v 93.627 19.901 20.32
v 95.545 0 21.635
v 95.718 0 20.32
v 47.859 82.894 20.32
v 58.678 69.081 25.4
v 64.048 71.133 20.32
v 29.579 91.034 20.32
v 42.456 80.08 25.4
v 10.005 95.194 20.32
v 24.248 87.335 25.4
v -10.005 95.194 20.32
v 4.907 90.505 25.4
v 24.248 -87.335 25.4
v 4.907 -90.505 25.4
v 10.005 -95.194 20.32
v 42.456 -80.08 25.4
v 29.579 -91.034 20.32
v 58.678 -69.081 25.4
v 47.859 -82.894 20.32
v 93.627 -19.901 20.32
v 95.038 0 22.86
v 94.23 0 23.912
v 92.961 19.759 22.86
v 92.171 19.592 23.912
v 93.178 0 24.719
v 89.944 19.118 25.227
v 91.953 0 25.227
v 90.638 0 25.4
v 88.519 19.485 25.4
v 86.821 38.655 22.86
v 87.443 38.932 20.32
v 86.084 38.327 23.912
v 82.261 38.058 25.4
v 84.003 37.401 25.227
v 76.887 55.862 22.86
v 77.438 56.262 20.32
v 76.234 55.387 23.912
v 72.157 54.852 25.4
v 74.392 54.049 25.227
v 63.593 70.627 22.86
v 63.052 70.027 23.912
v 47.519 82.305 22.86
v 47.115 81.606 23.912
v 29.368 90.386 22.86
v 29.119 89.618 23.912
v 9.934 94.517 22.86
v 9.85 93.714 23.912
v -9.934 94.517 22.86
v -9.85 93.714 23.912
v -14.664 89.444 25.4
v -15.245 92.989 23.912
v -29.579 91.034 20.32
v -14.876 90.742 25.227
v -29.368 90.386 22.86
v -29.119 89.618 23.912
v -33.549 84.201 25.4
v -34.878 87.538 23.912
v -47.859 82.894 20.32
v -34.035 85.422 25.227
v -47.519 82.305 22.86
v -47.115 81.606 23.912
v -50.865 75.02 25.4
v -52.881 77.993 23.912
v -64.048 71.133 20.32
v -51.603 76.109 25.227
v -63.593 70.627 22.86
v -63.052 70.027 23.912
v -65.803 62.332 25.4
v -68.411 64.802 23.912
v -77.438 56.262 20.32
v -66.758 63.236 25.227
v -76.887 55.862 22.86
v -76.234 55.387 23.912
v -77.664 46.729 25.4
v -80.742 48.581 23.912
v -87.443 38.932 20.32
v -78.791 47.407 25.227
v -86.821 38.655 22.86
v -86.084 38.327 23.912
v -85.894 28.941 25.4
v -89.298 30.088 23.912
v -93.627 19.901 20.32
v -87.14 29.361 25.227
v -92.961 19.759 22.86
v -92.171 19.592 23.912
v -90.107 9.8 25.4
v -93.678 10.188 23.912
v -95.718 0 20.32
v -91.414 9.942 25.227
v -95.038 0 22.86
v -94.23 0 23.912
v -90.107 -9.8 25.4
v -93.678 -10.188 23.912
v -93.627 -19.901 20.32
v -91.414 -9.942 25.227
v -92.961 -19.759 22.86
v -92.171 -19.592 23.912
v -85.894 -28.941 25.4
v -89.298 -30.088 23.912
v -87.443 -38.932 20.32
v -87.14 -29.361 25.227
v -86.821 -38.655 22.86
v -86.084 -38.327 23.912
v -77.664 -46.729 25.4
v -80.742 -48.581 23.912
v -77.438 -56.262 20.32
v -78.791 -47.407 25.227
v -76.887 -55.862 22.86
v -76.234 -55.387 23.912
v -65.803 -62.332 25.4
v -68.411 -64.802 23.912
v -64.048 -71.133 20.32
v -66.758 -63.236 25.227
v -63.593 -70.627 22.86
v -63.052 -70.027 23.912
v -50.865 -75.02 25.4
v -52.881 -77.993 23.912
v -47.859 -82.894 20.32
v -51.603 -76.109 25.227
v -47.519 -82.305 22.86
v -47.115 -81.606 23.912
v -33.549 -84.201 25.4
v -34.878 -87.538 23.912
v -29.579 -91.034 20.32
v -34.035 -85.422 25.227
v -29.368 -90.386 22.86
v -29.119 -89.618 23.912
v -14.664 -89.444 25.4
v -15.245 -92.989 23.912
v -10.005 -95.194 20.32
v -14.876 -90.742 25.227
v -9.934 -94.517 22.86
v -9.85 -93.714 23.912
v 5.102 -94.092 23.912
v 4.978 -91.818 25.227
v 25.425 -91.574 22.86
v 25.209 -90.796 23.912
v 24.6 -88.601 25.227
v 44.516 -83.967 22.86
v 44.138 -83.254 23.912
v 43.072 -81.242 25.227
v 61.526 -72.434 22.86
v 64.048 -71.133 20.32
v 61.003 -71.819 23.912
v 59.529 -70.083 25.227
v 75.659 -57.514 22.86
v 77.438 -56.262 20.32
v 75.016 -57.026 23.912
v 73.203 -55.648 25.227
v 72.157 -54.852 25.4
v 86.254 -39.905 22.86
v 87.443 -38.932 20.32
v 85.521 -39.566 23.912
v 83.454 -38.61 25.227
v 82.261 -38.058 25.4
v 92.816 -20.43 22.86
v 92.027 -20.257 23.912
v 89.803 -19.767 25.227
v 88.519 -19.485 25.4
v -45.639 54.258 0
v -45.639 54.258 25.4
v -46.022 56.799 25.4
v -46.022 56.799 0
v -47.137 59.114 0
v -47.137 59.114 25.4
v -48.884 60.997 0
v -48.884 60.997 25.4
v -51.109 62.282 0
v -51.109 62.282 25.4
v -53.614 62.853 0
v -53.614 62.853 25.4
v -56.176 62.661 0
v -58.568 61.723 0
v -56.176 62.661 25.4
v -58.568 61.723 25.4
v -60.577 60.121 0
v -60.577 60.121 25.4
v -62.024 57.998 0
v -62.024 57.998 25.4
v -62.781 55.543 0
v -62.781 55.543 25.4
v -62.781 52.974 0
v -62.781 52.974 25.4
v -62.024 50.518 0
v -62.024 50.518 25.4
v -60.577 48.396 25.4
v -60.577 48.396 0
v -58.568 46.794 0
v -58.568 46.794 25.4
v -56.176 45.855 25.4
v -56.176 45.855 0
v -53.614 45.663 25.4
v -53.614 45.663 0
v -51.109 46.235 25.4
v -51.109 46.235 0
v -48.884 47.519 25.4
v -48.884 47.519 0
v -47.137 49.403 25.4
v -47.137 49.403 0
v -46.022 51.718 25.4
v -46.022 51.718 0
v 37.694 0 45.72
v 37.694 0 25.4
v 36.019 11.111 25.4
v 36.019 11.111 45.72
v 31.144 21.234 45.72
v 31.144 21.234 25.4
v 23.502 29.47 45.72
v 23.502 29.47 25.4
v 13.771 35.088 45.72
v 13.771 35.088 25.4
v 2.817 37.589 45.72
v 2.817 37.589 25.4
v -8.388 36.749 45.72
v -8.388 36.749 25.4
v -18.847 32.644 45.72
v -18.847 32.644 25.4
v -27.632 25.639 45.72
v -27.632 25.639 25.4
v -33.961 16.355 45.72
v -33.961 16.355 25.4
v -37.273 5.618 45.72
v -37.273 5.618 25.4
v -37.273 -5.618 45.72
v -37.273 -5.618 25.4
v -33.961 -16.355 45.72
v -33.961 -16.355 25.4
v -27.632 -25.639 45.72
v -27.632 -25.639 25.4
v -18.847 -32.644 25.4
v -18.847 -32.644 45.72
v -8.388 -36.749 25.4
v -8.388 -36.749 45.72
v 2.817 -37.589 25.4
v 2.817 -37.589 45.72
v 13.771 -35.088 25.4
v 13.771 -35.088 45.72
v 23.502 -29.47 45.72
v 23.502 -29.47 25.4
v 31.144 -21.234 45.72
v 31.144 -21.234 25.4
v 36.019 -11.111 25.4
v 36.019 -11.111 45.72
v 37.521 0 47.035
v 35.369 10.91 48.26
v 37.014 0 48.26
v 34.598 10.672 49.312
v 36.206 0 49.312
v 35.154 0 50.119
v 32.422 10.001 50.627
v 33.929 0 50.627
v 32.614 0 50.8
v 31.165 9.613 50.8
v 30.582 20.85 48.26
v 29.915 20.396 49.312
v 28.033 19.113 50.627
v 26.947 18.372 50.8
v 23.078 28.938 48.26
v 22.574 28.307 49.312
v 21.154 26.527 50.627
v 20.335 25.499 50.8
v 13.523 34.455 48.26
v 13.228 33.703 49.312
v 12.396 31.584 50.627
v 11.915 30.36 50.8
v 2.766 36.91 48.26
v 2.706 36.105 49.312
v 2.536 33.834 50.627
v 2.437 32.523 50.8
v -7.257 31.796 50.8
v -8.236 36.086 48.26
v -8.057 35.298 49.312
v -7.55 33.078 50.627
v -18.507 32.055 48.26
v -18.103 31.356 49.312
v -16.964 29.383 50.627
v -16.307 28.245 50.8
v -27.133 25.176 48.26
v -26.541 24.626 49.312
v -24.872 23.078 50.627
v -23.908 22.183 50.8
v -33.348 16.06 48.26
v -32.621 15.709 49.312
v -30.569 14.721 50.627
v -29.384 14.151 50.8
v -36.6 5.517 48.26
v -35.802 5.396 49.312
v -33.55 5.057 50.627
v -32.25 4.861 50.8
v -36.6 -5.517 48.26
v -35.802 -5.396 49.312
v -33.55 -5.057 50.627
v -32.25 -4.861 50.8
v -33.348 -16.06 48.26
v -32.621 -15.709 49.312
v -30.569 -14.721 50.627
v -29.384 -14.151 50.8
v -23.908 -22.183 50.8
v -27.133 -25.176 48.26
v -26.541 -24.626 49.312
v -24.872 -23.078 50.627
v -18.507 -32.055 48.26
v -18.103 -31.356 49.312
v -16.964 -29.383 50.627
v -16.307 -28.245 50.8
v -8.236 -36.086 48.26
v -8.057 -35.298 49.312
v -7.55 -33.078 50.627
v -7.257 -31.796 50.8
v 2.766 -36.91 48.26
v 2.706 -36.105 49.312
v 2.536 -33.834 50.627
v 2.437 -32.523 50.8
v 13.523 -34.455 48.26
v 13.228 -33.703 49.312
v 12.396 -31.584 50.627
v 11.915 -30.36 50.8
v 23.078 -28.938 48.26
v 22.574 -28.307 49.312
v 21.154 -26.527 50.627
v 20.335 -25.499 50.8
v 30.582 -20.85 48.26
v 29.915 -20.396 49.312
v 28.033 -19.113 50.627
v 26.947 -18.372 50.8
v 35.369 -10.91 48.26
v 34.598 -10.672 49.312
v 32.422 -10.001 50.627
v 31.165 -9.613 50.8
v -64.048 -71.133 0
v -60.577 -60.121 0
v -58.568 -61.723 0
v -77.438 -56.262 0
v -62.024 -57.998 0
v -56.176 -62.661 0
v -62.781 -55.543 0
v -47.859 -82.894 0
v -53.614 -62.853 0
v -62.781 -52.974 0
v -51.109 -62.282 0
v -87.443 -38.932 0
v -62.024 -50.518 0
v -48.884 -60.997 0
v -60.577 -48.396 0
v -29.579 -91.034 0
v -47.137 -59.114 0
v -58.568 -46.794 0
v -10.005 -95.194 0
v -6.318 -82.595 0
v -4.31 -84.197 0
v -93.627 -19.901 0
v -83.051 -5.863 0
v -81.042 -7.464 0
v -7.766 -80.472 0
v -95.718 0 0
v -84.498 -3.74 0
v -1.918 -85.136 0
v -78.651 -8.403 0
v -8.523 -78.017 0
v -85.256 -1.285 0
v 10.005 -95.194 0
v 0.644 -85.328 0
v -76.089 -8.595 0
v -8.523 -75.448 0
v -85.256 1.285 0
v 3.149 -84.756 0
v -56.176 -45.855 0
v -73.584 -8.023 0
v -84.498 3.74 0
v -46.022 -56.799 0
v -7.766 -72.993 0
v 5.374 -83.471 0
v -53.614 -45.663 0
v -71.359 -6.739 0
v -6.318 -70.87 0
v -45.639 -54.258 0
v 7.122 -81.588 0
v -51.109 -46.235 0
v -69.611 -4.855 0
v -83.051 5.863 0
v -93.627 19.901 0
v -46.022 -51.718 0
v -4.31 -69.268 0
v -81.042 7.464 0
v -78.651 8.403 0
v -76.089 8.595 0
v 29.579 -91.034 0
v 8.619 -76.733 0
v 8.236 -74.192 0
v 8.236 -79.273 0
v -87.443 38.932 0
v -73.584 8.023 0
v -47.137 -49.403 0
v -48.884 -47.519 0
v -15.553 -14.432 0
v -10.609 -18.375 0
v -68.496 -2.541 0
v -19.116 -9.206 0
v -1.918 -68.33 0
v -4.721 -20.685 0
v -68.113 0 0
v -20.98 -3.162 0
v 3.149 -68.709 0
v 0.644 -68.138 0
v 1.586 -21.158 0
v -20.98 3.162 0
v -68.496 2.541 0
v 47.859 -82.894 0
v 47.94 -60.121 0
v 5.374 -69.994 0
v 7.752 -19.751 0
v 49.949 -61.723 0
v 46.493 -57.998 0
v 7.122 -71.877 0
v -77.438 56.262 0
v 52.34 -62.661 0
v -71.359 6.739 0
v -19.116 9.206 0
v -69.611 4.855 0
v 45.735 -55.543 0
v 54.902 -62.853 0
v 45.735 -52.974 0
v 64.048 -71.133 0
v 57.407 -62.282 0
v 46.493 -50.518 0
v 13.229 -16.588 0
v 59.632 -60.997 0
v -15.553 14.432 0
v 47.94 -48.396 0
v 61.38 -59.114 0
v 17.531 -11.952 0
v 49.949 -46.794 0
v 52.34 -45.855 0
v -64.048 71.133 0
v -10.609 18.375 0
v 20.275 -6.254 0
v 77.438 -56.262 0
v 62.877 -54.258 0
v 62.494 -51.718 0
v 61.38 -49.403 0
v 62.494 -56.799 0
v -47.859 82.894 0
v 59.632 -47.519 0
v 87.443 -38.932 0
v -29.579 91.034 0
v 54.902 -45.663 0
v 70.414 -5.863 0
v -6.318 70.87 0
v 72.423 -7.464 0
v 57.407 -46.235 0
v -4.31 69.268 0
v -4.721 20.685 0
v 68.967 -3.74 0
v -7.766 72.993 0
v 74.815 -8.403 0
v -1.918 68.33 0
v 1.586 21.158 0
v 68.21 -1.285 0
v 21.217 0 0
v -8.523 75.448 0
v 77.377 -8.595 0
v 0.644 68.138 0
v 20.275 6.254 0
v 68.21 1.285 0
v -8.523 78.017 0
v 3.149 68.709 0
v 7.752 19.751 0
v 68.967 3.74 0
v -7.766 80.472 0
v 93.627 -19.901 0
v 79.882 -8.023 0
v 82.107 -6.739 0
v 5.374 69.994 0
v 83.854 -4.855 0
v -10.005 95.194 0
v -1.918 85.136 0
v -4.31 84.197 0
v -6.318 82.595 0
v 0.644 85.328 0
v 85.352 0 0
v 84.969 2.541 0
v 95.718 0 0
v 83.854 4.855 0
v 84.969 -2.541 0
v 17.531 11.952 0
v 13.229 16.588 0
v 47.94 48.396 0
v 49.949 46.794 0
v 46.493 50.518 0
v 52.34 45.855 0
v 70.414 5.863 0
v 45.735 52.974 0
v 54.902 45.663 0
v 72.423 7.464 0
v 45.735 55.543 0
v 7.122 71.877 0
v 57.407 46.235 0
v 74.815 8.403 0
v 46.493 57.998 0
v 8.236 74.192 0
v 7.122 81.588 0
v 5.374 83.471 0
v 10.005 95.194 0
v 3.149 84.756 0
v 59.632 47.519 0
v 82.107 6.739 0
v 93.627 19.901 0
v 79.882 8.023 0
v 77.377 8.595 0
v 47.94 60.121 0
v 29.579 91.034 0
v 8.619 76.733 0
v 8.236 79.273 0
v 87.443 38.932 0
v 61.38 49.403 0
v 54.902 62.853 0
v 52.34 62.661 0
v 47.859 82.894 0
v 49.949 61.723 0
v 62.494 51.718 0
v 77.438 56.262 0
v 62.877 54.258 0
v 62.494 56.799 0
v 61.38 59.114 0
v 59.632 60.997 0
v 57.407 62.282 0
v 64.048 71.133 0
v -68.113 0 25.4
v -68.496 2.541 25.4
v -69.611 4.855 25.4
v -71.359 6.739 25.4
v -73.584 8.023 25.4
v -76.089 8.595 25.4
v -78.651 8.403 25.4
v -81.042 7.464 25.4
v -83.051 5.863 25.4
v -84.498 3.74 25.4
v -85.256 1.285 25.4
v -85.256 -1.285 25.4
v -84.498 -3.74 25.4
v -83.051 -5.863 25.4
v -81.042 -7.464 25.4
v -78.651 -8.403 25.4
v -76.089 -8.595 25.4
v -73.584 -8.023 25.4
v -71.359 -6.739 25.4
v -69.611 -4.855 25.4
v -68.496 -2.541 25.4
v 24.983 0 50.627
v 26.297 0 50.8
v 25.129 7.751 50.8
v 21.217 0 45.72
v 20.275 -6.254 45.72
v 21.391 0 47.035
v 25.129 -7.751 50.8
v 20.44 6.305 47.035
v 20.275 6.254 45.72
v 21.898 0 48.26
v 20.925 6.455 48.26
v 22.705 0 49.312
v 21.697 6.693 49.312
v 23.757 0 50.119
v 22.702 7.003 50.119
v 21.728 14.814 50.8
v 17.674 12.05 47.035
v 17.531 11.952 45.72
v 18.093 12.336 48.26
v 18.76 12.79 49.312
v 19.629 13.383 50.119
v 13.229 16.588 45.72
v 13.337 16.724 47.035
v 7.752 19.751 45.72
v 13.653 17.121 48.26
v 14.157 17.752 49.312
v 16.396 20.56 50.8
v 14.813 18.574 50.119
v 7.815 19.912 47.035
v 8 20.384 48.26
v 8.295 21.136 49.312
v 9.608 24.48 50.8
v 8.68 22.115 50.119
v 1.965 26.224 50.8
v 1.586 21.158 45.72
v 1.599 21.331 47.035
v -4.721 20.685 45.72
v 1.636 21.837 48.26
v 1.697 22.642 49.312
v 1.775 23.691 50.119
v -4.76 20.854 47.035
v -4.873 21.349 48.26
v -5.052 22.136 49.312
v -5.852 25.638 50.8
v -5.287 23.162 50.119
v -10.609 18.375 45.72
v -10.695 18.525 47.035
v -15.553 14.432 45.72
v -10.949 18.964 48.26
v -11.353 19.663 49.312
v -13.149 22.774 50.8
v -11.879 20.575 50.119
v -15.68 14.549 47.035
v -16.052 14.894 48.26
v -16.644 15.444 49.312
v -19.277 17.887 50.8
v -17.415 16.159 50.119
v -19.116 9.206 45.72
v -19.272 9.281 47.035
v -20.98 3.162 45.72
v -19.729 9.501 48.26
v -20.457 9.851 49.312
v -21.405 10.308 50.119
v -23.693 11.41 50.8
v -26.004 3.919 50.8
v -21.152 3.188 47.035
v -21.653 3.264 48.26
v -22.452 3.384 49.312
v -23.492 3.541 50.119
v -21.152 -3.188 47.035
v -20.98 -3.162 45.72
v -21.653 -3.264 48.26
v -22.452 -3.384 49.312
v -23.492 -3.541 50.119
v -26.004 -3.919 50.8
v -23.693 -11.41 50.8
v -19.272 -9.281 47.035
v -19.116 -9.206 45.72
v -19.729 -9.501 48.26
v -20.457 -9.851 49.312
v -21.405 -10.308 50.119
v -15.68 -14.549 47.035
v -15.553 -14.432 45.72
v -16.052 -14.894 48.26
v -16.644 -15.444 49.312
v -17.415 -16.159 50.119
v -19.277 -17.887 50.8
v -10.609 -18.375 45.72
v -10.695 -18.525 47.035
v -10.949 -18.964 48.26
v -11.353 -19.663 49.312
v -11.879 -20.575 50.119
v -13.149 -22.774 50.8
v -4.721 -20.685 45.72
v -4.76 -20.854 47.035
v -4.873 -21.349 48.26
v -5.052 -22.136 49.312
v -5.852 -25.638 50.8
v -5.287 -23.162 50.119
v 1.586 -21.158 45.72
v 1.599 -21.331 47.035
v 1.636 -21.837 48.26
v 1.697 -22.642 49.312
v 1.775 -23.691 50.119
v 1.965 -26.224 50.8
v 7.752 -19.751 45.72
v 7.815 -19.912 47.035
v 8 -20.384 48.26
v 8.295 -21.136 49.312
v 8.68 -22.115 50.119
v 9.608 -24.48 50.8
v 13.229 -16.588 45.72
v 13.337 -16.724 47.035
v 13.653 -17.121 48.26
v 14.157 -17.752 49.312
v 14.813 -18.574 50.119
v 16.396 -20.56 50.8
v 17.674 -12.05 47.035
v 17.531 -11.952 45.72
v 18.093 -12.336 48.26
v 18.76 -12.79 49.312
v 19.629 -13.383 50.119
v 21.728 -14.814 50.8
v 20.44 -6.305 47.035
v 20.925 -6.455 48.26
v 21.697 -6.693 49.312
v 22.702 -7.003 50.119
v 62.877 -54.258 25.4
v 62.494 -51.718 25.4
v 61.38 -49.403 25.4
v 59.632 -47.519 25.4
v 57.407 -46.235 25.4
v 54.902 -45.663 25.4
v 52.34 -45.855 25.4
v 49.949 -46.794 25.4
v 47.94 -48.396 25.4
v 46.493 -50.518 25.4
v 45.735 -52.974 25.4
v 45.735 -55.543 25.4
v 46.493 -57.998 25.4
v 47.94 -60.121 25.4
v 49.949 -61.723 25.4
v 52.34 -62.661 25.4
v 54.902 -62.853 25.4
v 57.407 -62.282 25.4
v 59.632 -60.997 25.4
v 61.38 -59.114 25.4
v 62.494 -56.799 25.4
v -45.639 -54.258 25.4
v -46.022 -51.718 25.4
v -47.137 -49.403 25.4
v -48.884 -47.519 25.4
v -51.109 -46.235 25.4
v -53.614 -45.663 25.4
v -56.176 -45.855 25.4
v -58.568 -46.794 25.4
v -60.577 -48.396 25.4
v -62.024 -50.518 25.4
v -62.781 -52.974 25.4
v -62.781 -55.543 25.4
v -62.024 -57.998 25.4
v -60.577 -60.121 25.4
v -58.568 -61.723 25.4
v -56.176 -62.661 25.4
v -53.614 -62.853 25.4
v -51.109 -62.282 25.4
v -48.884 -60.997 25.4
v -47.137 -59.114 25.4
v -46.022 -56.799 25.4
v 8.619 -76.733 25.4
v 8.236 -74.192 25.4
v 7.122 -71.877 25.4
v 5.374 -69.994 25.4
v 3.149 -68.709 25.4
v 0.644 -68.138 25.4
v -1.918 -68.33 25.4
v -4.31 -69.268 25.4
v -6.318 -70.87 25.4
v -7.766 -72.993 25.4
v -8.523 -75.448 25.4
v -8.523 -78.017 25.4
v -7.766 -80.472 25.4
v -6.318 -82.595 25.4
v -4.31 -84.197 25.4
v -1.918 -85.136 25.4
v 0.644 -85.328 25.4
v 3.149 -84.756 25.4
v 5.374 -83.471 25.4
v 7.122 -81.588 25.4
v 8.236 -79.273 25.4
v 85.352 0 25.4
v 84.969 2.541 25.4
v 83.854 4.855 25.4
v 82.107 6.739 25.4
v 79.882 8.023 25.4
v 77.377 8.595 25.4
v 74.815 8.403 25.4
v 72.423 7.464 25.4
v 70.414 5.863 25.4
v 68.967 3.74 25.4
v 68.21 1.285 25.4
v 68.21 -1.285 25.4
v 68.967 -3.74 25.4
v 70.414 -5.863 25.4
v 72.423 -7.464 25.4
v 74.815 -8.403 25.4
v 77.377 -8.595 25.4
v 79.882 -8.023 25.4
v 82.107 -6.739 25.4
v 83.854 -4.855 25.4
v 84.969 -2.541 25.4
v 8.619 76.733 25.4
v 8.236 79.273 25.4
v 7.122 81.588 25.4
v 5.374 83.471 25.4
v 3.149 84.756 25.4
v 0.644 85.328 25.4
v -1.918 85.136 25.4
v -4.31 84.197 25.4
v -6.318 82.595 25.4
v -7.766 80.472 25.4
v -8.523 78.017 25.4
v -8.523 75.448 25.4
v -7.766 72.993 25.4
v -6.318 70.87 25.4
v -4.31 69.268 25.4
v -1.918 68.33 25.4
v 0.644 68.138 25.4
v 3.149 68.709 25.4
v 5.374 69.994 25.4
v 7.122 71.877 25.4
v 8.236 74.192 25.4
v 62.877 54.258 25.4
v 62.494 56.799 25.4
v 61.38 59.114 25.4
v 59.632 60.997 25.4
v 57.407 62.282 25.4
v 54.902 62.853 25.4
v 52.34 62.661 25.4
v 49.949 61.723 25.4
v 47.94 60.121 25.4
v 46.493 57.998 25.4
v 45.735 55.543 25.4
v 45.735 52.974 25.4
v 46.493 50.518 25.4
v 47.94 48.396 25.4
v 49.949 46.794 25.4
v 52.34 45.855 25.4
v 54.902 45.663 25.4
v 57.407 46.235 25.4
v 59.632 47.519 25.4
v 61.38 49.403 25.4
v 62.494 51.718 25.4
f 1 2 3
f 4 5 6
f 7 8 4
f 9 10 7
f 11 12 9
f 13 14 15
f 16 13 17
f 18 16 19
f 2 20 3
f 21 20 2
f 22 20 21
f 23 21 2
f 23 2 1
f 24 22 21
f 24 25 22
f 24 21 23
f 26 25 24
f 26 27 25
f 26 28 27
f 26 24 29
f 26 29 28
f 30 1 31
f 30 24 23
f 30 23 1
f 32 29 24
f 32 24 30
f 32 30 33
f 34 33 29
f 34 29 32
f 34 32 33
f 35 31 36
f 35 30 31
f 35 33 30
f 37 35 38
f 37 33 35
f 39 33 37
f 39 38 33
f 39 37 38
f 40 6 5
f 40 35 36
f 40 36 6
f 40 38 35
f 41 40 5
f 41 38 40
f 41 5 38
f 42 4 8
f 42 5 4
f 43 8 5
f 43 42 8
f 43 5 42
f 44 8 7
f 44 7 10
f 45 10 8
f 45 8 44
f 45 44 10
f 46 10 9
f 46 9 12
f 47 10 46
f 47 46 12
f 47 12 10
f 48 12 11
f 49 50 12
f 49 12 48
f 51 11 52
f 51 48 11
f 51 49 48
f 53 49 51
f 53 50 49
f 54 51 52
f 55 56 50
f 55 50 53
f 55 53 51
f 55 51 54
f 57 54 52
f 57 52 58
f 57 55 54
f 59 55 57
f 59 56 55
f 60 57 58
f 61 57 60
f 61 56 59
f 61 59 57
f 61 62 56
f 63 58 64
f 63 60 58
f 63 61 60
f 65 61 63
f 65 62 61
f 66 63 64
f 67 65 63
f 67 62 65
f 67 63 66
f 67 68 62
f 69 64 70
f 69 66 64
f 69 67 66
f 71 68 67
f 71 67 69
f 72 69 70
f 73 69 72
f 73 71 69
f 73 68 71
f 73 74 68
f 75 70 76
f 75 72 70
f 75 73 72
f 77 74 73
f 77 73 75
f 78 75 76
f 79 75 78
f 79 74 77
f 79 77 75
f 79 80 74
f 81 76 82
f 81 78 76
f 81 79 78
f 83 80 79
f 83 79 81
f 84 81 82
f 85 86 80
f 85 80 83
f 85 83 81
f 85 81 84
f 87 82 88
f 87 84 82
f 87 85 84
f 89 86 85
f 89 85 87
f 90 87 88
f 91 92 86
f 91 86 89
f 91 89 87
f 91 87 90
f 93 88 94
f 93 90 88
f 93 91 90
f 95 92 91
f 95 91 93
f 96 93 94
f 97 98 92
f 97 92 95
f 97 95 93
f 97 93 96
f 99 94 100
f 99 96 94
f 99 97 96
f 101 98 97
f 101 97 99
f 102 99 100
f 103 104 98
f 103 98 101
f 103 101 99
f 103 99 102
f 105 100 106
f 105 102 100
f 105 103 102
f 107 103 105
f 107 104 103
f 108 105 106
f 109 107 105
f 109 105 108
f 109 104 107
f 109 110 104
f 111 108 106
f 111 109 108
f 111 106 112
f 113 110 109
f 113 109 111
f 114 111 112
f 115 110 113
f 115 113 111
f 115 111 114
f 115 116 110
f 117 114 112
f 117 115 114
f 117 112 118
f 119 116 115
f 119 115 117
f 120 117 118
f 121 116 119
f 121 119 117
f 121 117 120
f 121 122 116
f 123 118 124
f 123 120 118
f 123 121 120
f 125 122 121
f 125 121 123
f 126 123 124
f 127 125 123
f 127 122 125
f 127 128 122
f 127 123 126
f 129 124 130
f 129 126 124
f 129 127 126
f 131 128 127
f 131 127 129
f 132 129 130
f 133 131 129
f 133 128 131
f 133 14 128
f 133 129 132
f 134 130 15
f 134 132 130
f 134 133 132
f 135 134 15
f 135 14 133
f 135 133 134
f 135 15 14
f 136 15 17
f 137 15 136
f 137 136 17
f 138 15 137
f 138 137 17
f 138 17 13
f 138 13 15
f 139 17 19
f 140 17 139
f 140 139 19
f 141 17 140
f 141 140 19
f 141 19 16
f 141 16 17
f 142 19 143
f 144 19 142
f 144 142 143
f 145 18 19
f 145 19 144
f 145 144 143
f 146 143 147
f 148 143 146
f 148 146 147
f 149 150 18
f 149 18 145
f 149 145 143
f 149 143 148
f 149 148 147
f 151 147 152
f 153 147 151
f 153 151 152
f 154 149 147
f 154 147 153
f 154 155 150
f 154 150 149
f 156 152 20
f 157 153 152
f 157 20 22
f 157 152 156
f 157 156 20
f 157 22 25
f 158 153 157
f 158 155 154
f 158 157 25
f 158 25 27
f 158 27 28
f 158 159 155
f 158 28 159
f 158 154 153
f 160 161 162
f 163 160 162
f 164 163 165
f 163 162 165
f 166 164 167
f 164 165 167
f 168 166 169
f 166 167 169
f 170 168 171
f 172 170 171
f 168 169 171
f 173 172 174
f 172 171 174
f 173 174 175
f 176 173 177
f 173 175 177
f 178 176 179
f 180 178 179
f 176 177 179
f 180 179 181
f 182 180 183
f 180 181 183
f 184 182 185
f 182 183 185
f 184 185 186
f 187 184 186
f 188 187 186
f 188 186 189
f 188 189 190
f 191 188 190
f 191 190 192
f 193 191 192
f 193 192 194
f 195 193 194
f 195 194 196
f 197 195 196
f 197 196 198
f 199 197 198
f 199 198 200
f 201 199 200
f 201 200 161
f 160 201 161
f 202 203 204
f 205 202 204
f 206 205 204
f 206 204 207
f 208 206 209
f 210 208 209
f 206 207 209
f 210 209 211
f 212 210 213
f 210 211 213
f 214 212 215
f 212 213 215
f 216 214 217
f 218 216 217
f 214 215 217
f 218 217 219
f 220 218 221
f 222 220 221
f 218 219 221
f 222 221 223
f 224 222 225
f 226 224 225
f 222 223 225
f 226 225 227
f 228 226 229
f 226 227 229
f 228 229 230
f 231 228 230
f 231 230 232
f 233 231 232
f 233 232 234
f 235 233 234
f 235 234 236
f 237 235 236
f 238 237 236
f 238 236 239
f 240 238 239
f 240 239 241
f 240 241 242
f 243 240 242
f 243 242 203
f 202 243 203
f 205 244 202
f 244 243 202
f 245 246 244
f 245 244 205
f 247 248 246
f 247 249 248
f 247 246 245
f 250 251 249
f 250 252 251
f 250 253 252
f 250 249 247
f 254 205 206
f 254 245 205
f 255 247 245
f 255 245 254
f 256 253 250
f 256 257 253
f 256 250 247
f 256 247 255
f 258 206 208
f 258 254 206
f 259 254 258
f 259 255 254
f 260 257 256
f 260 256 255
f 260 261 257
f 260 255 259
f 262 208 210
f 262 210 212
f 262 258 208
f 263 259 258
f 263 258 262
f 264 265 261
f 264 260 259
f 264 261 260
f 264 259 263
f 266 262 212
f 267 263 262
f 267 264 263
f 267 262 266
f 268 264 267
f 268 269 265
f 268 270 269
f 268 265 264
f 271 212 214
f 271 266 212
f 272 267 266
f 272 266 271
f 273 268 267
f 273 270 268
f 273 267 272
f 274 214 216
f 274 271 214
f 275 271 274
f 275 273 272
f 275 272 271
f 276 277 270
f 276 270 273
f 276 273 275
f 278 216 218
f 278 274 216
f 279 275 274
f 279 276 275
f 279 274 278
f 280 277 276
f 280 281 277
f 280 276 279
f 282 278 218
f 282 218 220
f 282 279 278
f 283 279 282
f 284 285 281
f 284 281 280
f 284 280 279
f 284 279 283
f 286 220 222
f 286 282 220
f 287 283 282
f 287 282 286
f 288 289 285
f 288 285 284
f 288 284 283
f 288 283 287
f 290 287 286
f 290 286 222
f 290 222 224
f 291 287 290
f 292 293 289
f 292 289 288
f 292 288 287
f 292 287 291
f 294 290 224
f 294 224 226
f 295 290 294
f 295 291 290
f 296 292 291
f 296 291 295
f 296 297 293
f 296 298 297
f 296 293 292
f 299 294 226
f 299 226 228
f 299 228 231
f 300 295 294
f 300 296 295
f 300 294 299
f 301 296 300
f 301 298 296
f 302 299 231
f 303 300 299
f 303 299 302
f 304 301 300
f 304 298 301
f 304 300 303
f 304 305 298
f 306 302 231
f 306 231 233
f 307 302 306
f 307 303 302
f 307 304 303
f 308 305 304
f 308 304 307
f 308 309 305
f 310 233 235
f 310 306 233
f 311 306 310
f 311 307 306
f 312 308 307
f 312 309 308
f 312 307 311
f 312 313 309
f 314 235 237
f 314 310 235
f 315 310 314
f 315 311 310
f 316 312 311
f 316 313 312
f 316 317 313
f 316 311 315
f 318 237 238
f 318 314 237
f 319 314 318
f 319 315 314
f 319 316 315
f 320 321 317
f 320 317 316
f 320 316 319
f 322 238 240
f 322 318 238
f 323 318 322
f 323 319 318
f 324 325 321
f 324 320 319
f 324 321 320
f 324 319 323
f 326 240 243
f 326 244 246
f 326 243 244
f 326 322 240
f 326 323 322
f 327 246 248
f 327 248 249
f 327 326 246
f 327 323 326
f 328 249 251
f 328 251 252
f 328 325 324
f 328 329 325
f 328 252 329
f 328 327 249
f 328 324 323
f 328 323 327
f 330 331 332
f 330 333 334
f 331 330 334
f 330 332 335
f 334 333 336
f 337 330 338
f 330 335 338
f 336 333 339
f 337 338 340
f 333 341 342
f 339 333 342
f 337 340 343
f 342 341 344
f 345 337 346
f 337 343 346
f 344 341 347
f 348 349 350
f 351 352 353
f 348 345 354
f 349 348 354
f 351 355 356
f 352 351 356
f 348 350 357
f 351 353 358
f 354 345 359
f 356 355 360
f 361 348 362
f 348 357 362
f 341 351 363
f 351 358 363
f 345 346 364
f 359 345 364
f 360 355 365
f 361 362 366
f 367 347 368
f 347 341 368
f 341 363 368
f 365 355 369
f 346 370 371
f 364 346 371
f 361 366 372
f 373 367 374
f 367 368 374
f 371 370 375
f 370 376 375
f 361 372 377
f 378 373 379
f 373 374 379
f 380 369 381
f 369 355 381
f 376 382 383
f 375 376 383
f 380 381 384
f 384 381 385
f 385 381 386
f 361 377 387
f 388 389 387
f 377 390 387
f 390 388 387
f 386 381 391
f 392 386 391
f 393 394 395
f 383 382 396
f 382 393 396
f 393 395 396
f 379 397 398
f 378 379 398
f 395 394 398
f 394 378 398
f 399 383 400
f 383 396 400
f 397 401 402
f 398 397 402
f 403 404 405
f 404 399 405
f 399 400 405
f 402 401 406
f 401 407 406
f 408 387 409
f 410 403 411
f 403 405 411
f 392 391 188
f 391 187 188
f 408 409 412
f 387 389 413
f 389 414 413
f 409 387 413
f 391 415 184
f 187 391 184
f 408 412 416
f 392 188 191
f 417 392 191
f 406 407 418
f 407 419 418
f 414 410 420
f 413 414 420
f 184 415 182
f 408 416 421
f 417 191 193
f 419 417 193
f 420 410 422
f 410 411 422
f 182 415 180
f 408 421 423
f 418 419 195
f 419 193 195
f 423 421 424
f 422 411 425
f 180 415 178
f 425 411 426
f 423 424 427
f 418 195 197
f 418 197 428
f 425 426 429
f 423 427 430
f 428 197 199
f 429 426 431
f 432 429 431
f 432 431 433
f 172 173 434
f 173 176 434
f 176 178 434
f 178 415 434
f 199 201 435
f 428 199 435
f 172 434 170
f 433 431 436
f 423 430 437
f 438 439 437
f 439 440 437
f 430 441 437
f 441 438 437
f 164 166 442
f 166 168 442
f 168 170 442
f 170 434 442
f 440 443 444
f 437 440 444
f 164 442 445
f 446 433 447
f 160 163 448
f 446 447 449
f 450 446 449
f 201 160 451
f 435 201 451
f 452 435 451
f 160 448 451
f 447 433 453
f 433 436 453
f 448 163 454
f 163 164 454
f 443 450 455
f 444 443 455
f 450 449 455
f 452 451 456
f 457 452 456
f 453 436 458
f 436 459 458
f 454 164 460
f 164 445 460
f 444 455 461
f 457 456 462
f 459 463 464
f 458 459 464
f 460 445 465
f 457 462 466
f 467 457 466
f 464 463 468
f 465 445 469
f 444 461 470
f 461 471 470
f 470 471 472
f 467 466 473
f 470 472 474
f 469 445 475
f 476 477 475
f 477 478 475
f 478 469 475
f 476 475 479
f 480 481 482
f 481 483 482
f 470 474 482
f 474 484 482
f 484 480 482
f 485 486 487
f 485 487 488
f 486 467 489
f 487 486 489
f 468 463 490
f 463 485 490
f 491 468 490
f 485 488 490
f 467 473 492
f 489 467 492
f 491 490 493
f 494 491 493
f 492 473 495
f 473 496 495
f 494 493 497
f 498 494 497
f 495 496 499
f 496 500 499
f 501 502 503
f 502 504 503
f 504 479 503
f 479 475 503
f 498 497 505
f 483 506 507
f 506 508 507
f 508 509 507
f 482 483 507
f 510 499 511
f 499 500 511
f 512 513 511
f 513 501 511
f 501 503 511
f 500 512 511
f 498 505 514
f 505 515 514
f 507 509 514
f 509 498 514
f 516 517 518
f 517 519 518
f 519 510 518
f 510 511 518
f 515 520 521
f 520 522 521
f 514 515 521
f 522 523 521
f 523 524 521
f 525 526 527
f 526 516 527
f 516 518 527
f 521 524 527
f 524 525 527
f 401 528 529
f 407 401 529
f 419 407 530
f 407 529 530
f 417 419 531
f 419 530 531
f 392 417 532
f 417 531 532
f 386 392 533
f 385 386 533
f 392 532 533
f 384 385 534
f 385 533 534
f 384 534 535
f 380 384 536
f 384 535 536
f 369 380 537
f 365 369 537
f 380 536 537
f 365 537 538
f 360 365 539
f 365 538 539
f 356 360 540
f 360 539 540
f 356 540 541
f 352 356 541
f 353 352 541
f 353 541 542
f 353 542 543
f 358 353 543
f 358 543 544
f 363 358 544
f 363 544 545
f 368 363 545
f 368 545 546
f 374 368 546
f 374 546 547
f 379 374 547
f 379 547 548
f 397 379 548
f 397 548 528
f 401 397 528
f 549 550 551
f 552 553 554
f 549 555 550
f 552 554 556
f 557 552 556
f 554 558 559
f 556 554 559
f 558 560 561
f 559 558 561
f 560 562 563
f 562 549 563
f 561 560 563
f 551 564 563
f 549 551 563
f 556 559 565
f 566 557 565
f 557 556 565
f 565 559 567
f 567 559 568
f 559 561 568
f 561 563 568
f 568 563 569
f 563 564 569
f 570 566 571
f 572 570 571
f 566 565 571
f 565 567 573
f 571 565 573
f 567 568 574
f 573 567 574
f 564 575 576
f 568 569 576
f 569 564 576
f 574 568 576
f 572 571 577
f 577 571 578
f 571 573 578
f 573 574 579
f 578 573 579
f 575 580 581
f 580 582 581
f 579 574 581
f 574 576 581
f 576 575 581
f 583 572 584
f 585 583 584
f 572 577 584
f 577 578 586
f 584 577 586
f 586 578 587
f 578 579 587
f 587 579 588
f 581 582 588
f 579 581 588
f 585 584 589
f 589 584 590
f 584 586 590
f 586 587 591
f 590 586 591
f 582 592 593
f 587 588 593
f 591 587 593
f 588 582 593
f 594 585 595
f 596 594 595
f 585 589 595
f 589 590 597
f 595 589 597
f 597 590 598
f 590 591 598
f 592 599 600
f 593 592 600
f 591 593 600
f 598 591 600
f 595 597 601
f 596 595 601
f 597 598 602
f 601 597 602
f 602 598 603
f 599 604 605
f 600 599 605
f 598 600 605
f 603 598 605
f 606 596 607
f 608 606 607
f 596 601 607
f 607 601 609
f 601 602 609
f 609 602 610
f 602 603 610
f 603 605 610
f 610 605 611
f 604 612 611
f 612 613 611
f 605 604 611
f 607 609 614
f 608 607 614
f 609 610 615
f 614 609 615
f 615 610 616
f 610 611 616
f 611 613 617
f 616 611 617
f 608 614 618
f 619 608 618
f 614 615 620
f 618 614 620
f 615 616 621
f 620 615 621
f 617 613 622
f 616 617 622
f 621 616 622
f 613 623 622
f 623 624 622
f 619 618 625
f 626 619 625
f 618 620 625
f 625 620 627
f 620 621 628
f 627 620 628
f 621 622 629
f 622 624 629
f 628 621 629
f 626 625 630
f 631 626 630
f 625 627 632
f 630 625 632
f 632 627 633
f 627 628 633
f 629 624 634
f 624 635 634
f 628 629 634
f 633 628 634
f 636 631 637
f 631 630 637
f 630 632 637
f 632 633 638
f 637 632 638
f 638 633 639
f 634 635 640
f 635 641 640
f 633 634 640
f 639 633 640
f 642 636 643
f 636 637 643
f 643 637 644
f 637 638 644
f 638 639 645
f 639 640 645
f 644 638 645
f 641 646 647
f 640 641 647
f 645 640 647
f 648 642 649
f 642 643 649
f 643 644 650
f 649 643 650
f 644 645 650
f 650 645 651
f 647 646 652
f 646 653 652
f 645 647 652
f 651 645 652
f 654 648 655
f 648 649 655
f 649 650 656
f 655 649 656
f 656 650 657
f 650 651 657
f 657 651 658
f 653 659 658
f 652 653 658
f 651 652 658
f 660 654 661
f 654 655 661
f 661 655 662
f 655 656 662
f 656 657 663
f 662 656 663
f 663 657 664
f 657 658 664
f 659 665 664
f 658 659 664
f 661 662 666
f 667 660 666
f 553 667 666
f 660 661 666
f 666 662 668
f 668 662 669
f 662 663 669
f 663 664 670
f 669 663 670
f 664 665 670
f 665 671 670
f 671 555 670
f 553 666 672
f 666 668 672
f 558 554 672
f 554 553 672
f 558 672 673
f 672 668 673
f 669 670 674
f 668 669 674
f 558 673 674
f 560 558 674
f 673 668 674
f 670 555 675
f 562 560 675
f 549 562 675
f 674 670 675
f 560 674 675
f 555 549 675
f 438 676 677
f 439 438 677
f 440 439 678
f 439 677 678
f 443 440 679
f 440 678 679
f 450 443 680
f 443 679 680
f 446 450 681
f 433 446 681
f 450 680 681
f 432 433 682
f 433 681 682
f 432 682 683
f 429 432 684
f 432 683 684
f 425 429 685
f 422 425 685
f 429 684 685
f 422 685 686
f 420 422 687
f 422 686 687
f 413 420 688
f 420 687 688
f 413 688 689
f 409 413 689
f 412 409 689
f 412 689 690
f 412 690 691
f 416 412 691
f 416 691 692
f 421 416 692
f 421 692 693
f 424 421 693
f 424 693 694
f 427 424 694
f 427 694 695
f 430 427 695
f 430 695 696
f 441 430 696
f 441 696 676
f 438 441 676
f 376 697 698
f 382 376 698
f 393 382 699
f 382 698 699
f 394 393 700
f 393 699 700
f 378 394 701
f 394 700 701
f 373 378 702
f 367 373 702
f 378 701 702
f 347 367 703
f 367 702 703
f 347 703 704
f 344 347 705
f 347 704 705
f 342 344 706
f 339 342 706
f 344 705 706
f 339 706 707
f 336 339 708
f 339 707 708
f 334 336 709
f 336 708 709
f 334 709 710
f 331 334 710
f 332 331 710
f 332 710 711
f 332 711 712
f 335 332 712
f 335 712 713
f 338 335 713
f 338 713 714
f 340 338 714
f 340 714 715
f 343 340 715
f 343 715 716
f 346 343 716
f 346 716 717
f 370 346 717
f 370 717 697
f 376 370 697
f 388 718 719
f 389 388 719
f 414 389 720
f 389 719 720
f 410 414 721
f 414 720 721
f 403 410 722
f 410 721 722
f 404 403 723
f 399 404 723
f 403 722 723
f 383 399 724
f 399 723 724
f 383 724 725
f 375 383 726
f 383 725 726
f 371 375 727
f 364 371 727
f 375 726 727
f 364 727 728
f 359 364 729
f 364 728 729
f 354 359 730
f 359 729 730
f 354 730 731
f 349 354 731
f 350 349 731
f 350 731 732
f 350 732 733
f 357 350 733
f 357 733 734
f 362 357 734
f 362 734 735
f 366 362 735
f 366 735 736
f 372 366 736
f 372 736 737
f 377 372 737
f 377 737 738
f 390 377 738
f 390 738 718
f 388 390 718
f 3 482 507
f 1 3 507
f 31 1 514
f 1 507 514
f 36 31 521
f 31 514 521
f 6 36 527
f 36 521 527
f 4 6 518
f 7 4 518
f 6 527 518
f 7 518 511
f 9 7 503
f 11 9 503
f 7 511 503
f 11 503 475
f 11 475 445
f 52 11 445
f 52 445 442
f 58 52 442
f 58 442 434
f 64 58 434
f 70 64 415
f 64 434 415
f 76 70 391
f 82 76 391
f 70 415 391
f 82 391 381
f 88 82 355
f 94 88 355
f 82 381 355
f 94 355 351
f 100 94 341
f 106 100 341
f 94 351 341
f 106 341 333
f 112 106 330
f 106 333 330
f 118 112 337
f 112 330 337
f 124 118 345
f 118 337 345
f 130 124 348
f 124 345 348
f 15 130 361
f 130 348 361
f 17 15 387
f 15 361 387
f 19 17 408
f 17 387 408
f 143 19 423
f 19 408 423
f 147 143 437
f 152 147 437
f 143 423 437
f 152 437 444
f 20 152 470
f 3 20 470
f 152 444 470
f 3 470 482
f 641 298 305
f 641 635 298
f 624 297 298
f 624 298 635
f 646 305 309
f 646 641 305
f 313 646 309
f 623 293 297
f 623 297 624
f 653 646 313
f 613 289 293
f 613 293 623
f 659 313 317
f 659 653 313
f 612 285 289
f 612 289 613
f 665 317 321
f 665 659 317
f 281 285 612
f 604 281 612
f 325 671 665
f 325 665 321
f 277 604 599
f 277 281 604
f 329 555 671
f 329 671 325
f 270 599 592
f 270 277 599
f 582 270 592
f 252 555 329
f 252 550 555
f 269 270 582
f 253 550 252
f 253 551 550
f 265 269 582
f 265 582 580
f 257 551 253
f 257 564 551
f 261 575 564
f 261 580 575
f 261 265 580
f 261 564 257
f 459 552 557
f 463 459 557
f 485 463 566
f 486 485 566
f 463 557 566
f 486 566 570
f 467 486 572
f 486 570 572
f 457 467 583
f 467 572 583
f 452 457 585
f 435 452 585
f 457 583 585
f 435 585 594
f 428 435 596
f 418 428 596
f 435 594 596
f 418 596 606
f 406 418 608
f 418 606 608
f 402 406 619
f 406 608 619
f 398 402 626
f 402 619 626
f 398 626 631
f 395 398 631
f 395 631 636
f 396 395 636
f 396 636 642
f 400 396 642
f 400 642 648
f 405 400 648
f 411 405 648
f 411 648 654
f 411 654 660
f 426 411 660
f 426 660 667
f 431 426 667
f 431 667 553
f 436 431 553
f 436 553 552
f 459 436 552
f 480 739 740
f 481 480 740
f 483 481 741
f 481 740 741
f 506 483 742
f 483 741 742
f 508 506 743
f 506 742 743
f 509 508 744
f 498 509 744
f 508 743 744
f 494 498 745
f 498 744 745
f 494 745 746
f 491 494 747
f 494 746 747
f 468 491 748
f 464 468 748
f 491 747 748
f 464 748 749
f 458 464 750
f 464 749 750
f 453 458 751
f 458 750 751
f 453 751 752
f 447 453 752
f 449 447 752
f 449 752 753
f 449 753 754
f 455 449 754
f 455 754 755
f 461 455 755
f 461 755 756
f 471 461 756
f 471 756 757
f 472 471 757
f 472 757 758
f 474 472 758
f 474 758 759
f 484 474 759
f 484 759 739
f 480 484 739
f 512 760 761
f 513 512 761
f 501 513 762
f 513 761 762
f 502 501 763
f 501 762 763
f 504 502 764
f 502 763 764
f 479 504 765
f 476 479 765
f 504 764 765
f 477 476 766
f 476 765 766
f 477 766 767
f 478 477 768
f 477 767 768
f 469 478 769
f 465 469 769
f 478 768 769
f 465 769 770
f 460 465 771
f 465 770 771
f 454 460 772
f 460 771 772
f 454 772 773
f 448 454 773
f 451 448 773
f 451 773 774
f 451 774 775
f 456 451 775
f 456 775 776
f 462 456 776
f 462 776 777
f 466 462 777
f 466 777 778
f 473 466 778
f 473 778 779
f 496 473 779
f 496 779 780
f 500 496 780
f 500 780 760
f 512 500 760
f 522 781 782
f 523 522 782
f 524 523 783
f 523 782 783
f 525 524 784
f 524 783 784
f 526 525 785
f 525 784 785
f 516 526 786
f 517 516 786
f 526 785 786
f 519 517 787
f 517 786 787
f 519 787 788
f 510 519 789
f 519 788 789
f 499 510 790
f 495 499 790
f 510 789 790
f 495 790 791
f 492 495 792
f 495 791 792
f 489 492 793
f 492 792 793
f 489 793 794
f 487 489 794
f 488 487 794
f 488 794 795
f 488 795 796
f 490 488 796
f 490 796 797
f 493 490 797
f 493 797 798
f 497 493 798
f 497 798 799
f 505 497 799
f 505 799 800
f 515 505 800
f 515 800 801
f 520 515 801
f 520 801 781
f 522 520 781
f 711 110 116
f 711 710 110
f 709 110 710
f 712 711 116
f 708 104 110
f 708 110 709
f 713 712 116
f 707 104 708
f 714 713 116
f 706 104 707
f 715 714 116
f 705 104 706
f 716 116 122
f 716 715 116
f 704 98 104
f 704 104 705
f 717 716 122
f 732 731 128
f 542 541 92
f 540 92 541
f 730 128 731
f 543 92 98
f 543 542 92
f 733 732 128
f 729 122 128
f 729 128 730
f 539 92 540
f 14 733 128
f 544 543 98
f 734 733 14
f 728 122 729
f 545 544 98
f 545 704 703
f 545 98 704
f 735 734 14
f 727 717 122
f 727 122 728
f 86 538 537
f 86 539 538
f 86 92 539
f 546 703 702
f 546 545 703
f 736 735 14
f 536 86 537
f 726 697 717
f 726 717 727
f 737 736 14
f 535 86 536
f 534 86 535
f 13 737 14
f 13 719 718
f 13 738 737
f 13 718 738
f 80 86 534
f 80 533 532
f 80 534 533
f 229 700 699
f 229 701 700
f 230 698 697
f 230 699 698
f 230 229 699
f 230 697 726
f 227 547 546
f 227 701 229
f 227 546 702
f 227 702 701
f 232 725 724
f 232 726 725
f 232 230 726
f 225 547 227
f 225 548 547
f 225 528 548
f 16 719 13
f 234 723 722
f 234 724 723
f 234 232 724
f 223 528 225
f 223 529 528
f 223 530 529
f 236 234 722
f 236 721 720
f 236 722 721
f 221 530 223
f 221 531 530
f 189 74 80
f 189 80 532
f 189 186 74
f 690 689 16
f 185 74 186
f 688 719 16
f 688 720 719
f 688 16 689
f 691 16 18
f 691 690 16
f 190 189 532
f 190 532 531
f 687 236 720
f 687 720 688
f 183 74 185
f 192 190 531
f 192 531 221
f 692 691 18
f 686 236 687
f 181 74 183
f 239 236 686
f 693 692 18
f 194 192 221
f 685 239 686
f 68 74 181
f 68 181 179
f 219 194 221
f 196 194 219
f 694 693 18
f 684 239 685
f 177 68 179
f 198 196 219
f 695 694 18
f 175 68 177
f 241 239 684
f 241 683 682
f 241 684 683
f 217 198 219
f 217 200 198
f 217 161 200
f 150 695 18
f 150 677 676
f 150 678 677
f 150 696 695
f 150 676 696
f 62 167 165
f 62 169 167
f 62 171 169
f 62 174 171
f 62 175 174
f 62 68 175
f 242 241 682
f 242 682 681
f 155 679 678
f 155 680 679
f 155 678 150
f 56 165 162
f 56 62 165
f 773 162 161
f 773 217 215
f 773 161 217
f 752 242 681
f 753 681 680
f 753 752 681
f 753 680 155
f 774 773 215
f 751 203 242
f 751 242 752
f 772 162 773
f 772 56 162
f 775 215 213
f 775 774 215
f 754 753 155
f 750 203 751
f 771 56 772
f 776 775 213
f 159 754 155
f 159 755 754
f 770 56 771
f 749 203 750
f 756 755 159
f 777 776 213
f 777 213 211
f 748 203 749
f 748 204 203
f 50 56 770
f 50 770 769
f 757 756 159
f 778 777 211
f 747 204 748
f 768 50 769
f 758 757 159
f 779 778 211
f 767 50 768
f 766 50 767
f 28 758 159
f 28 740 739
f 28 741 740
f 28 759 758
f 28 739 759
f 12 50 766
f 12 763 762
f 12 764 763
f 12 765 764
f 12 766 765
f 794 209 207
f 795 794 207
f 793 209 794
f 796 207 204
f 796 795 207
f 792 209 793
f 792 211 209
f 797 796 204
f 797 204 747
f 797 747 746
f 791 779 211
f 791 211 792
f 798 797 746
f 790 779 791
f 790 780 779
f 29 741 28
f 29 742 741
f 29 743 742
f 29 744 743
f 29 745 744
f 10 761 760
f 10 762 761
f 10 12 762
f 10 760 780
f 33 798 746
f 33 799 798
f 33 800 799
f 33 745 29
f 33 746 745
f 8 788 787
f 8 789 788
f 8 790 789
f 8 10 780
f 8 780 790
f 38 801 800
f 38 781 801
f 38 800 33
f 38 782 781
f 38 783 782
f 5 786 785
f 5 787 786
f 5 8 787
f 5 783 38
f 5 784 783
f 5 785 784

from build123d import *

# Parameters (mm, degrees)
F0_R     = 37.69412
F1_DEPTH = 50.8
F0_R_2   = 95.718309
F2_DEPTH = 25.4
F3_R     = 8.619193
F4_DEPTH = 25.401
F5_R     = 21.217436
F6_DEPTH = 50.801
F7_R     = 5.08


with BuildPart() as f1:
    # F0 (on Top) → F1 (new body)
    with BuildSketch(Plane.XY):
        Circle(F0_R)
    extrude(amount=F1_DEPTH)

    # F0 (on Top) → F2 (join)
    with BuildSketch(Plane.XY):
        Circle(F0_R_2)
        Circle(F0_R, mode=Mode.SUBTRACT)
    extrude(amount=F2_DEPTH)

    # F3 (on face) → F4 (cut, through all)
    with BuildSketch(Plane.XY.offset(25.4)):
        with Locations((0, 76.732688)):
            Circle(F3_R)
        with Locations((-54.258204, 54.258204)):
            Circle(F3_R)
        with Locations((-76.732688, 0)):
            Circle(F3_R)
        with Locations((-54.258204, -54.258204)):
            Circle(F3_R)
        with Locations((0, -76.732688)):
            Circle(F3_R)
        with Locations((54.258204, -54.258204)):
            Circle(F3_R)
        with Locations((76.732688, 0)):
            Circle(F3_R)
        with Locations((54.258204, 54.258204)):
            Circle(F3_R)
    extrude(amount=-F4_DEPTH, mode=Mode.SUBTRACT)

    # F5 (on face) → F6 (cut, through all)
    with BuildSketch(Plane.XY.offset(50.8)):
        Circle(F5_R)
    extrude(amount=-F6_DEPTH, mode=Mode.SUBTRACT)

    # F7
    f7_edges = [f1.edges().sort_by_distance(p)[0] for p in [
        (-95.718309, 0, 25.4),
        (-37.69412, 0, 50.8),
        (-21.217436, 0, 50.8),
    ]]
    fillet(f7_edges, radius=F7_R)


solid = f1.part
